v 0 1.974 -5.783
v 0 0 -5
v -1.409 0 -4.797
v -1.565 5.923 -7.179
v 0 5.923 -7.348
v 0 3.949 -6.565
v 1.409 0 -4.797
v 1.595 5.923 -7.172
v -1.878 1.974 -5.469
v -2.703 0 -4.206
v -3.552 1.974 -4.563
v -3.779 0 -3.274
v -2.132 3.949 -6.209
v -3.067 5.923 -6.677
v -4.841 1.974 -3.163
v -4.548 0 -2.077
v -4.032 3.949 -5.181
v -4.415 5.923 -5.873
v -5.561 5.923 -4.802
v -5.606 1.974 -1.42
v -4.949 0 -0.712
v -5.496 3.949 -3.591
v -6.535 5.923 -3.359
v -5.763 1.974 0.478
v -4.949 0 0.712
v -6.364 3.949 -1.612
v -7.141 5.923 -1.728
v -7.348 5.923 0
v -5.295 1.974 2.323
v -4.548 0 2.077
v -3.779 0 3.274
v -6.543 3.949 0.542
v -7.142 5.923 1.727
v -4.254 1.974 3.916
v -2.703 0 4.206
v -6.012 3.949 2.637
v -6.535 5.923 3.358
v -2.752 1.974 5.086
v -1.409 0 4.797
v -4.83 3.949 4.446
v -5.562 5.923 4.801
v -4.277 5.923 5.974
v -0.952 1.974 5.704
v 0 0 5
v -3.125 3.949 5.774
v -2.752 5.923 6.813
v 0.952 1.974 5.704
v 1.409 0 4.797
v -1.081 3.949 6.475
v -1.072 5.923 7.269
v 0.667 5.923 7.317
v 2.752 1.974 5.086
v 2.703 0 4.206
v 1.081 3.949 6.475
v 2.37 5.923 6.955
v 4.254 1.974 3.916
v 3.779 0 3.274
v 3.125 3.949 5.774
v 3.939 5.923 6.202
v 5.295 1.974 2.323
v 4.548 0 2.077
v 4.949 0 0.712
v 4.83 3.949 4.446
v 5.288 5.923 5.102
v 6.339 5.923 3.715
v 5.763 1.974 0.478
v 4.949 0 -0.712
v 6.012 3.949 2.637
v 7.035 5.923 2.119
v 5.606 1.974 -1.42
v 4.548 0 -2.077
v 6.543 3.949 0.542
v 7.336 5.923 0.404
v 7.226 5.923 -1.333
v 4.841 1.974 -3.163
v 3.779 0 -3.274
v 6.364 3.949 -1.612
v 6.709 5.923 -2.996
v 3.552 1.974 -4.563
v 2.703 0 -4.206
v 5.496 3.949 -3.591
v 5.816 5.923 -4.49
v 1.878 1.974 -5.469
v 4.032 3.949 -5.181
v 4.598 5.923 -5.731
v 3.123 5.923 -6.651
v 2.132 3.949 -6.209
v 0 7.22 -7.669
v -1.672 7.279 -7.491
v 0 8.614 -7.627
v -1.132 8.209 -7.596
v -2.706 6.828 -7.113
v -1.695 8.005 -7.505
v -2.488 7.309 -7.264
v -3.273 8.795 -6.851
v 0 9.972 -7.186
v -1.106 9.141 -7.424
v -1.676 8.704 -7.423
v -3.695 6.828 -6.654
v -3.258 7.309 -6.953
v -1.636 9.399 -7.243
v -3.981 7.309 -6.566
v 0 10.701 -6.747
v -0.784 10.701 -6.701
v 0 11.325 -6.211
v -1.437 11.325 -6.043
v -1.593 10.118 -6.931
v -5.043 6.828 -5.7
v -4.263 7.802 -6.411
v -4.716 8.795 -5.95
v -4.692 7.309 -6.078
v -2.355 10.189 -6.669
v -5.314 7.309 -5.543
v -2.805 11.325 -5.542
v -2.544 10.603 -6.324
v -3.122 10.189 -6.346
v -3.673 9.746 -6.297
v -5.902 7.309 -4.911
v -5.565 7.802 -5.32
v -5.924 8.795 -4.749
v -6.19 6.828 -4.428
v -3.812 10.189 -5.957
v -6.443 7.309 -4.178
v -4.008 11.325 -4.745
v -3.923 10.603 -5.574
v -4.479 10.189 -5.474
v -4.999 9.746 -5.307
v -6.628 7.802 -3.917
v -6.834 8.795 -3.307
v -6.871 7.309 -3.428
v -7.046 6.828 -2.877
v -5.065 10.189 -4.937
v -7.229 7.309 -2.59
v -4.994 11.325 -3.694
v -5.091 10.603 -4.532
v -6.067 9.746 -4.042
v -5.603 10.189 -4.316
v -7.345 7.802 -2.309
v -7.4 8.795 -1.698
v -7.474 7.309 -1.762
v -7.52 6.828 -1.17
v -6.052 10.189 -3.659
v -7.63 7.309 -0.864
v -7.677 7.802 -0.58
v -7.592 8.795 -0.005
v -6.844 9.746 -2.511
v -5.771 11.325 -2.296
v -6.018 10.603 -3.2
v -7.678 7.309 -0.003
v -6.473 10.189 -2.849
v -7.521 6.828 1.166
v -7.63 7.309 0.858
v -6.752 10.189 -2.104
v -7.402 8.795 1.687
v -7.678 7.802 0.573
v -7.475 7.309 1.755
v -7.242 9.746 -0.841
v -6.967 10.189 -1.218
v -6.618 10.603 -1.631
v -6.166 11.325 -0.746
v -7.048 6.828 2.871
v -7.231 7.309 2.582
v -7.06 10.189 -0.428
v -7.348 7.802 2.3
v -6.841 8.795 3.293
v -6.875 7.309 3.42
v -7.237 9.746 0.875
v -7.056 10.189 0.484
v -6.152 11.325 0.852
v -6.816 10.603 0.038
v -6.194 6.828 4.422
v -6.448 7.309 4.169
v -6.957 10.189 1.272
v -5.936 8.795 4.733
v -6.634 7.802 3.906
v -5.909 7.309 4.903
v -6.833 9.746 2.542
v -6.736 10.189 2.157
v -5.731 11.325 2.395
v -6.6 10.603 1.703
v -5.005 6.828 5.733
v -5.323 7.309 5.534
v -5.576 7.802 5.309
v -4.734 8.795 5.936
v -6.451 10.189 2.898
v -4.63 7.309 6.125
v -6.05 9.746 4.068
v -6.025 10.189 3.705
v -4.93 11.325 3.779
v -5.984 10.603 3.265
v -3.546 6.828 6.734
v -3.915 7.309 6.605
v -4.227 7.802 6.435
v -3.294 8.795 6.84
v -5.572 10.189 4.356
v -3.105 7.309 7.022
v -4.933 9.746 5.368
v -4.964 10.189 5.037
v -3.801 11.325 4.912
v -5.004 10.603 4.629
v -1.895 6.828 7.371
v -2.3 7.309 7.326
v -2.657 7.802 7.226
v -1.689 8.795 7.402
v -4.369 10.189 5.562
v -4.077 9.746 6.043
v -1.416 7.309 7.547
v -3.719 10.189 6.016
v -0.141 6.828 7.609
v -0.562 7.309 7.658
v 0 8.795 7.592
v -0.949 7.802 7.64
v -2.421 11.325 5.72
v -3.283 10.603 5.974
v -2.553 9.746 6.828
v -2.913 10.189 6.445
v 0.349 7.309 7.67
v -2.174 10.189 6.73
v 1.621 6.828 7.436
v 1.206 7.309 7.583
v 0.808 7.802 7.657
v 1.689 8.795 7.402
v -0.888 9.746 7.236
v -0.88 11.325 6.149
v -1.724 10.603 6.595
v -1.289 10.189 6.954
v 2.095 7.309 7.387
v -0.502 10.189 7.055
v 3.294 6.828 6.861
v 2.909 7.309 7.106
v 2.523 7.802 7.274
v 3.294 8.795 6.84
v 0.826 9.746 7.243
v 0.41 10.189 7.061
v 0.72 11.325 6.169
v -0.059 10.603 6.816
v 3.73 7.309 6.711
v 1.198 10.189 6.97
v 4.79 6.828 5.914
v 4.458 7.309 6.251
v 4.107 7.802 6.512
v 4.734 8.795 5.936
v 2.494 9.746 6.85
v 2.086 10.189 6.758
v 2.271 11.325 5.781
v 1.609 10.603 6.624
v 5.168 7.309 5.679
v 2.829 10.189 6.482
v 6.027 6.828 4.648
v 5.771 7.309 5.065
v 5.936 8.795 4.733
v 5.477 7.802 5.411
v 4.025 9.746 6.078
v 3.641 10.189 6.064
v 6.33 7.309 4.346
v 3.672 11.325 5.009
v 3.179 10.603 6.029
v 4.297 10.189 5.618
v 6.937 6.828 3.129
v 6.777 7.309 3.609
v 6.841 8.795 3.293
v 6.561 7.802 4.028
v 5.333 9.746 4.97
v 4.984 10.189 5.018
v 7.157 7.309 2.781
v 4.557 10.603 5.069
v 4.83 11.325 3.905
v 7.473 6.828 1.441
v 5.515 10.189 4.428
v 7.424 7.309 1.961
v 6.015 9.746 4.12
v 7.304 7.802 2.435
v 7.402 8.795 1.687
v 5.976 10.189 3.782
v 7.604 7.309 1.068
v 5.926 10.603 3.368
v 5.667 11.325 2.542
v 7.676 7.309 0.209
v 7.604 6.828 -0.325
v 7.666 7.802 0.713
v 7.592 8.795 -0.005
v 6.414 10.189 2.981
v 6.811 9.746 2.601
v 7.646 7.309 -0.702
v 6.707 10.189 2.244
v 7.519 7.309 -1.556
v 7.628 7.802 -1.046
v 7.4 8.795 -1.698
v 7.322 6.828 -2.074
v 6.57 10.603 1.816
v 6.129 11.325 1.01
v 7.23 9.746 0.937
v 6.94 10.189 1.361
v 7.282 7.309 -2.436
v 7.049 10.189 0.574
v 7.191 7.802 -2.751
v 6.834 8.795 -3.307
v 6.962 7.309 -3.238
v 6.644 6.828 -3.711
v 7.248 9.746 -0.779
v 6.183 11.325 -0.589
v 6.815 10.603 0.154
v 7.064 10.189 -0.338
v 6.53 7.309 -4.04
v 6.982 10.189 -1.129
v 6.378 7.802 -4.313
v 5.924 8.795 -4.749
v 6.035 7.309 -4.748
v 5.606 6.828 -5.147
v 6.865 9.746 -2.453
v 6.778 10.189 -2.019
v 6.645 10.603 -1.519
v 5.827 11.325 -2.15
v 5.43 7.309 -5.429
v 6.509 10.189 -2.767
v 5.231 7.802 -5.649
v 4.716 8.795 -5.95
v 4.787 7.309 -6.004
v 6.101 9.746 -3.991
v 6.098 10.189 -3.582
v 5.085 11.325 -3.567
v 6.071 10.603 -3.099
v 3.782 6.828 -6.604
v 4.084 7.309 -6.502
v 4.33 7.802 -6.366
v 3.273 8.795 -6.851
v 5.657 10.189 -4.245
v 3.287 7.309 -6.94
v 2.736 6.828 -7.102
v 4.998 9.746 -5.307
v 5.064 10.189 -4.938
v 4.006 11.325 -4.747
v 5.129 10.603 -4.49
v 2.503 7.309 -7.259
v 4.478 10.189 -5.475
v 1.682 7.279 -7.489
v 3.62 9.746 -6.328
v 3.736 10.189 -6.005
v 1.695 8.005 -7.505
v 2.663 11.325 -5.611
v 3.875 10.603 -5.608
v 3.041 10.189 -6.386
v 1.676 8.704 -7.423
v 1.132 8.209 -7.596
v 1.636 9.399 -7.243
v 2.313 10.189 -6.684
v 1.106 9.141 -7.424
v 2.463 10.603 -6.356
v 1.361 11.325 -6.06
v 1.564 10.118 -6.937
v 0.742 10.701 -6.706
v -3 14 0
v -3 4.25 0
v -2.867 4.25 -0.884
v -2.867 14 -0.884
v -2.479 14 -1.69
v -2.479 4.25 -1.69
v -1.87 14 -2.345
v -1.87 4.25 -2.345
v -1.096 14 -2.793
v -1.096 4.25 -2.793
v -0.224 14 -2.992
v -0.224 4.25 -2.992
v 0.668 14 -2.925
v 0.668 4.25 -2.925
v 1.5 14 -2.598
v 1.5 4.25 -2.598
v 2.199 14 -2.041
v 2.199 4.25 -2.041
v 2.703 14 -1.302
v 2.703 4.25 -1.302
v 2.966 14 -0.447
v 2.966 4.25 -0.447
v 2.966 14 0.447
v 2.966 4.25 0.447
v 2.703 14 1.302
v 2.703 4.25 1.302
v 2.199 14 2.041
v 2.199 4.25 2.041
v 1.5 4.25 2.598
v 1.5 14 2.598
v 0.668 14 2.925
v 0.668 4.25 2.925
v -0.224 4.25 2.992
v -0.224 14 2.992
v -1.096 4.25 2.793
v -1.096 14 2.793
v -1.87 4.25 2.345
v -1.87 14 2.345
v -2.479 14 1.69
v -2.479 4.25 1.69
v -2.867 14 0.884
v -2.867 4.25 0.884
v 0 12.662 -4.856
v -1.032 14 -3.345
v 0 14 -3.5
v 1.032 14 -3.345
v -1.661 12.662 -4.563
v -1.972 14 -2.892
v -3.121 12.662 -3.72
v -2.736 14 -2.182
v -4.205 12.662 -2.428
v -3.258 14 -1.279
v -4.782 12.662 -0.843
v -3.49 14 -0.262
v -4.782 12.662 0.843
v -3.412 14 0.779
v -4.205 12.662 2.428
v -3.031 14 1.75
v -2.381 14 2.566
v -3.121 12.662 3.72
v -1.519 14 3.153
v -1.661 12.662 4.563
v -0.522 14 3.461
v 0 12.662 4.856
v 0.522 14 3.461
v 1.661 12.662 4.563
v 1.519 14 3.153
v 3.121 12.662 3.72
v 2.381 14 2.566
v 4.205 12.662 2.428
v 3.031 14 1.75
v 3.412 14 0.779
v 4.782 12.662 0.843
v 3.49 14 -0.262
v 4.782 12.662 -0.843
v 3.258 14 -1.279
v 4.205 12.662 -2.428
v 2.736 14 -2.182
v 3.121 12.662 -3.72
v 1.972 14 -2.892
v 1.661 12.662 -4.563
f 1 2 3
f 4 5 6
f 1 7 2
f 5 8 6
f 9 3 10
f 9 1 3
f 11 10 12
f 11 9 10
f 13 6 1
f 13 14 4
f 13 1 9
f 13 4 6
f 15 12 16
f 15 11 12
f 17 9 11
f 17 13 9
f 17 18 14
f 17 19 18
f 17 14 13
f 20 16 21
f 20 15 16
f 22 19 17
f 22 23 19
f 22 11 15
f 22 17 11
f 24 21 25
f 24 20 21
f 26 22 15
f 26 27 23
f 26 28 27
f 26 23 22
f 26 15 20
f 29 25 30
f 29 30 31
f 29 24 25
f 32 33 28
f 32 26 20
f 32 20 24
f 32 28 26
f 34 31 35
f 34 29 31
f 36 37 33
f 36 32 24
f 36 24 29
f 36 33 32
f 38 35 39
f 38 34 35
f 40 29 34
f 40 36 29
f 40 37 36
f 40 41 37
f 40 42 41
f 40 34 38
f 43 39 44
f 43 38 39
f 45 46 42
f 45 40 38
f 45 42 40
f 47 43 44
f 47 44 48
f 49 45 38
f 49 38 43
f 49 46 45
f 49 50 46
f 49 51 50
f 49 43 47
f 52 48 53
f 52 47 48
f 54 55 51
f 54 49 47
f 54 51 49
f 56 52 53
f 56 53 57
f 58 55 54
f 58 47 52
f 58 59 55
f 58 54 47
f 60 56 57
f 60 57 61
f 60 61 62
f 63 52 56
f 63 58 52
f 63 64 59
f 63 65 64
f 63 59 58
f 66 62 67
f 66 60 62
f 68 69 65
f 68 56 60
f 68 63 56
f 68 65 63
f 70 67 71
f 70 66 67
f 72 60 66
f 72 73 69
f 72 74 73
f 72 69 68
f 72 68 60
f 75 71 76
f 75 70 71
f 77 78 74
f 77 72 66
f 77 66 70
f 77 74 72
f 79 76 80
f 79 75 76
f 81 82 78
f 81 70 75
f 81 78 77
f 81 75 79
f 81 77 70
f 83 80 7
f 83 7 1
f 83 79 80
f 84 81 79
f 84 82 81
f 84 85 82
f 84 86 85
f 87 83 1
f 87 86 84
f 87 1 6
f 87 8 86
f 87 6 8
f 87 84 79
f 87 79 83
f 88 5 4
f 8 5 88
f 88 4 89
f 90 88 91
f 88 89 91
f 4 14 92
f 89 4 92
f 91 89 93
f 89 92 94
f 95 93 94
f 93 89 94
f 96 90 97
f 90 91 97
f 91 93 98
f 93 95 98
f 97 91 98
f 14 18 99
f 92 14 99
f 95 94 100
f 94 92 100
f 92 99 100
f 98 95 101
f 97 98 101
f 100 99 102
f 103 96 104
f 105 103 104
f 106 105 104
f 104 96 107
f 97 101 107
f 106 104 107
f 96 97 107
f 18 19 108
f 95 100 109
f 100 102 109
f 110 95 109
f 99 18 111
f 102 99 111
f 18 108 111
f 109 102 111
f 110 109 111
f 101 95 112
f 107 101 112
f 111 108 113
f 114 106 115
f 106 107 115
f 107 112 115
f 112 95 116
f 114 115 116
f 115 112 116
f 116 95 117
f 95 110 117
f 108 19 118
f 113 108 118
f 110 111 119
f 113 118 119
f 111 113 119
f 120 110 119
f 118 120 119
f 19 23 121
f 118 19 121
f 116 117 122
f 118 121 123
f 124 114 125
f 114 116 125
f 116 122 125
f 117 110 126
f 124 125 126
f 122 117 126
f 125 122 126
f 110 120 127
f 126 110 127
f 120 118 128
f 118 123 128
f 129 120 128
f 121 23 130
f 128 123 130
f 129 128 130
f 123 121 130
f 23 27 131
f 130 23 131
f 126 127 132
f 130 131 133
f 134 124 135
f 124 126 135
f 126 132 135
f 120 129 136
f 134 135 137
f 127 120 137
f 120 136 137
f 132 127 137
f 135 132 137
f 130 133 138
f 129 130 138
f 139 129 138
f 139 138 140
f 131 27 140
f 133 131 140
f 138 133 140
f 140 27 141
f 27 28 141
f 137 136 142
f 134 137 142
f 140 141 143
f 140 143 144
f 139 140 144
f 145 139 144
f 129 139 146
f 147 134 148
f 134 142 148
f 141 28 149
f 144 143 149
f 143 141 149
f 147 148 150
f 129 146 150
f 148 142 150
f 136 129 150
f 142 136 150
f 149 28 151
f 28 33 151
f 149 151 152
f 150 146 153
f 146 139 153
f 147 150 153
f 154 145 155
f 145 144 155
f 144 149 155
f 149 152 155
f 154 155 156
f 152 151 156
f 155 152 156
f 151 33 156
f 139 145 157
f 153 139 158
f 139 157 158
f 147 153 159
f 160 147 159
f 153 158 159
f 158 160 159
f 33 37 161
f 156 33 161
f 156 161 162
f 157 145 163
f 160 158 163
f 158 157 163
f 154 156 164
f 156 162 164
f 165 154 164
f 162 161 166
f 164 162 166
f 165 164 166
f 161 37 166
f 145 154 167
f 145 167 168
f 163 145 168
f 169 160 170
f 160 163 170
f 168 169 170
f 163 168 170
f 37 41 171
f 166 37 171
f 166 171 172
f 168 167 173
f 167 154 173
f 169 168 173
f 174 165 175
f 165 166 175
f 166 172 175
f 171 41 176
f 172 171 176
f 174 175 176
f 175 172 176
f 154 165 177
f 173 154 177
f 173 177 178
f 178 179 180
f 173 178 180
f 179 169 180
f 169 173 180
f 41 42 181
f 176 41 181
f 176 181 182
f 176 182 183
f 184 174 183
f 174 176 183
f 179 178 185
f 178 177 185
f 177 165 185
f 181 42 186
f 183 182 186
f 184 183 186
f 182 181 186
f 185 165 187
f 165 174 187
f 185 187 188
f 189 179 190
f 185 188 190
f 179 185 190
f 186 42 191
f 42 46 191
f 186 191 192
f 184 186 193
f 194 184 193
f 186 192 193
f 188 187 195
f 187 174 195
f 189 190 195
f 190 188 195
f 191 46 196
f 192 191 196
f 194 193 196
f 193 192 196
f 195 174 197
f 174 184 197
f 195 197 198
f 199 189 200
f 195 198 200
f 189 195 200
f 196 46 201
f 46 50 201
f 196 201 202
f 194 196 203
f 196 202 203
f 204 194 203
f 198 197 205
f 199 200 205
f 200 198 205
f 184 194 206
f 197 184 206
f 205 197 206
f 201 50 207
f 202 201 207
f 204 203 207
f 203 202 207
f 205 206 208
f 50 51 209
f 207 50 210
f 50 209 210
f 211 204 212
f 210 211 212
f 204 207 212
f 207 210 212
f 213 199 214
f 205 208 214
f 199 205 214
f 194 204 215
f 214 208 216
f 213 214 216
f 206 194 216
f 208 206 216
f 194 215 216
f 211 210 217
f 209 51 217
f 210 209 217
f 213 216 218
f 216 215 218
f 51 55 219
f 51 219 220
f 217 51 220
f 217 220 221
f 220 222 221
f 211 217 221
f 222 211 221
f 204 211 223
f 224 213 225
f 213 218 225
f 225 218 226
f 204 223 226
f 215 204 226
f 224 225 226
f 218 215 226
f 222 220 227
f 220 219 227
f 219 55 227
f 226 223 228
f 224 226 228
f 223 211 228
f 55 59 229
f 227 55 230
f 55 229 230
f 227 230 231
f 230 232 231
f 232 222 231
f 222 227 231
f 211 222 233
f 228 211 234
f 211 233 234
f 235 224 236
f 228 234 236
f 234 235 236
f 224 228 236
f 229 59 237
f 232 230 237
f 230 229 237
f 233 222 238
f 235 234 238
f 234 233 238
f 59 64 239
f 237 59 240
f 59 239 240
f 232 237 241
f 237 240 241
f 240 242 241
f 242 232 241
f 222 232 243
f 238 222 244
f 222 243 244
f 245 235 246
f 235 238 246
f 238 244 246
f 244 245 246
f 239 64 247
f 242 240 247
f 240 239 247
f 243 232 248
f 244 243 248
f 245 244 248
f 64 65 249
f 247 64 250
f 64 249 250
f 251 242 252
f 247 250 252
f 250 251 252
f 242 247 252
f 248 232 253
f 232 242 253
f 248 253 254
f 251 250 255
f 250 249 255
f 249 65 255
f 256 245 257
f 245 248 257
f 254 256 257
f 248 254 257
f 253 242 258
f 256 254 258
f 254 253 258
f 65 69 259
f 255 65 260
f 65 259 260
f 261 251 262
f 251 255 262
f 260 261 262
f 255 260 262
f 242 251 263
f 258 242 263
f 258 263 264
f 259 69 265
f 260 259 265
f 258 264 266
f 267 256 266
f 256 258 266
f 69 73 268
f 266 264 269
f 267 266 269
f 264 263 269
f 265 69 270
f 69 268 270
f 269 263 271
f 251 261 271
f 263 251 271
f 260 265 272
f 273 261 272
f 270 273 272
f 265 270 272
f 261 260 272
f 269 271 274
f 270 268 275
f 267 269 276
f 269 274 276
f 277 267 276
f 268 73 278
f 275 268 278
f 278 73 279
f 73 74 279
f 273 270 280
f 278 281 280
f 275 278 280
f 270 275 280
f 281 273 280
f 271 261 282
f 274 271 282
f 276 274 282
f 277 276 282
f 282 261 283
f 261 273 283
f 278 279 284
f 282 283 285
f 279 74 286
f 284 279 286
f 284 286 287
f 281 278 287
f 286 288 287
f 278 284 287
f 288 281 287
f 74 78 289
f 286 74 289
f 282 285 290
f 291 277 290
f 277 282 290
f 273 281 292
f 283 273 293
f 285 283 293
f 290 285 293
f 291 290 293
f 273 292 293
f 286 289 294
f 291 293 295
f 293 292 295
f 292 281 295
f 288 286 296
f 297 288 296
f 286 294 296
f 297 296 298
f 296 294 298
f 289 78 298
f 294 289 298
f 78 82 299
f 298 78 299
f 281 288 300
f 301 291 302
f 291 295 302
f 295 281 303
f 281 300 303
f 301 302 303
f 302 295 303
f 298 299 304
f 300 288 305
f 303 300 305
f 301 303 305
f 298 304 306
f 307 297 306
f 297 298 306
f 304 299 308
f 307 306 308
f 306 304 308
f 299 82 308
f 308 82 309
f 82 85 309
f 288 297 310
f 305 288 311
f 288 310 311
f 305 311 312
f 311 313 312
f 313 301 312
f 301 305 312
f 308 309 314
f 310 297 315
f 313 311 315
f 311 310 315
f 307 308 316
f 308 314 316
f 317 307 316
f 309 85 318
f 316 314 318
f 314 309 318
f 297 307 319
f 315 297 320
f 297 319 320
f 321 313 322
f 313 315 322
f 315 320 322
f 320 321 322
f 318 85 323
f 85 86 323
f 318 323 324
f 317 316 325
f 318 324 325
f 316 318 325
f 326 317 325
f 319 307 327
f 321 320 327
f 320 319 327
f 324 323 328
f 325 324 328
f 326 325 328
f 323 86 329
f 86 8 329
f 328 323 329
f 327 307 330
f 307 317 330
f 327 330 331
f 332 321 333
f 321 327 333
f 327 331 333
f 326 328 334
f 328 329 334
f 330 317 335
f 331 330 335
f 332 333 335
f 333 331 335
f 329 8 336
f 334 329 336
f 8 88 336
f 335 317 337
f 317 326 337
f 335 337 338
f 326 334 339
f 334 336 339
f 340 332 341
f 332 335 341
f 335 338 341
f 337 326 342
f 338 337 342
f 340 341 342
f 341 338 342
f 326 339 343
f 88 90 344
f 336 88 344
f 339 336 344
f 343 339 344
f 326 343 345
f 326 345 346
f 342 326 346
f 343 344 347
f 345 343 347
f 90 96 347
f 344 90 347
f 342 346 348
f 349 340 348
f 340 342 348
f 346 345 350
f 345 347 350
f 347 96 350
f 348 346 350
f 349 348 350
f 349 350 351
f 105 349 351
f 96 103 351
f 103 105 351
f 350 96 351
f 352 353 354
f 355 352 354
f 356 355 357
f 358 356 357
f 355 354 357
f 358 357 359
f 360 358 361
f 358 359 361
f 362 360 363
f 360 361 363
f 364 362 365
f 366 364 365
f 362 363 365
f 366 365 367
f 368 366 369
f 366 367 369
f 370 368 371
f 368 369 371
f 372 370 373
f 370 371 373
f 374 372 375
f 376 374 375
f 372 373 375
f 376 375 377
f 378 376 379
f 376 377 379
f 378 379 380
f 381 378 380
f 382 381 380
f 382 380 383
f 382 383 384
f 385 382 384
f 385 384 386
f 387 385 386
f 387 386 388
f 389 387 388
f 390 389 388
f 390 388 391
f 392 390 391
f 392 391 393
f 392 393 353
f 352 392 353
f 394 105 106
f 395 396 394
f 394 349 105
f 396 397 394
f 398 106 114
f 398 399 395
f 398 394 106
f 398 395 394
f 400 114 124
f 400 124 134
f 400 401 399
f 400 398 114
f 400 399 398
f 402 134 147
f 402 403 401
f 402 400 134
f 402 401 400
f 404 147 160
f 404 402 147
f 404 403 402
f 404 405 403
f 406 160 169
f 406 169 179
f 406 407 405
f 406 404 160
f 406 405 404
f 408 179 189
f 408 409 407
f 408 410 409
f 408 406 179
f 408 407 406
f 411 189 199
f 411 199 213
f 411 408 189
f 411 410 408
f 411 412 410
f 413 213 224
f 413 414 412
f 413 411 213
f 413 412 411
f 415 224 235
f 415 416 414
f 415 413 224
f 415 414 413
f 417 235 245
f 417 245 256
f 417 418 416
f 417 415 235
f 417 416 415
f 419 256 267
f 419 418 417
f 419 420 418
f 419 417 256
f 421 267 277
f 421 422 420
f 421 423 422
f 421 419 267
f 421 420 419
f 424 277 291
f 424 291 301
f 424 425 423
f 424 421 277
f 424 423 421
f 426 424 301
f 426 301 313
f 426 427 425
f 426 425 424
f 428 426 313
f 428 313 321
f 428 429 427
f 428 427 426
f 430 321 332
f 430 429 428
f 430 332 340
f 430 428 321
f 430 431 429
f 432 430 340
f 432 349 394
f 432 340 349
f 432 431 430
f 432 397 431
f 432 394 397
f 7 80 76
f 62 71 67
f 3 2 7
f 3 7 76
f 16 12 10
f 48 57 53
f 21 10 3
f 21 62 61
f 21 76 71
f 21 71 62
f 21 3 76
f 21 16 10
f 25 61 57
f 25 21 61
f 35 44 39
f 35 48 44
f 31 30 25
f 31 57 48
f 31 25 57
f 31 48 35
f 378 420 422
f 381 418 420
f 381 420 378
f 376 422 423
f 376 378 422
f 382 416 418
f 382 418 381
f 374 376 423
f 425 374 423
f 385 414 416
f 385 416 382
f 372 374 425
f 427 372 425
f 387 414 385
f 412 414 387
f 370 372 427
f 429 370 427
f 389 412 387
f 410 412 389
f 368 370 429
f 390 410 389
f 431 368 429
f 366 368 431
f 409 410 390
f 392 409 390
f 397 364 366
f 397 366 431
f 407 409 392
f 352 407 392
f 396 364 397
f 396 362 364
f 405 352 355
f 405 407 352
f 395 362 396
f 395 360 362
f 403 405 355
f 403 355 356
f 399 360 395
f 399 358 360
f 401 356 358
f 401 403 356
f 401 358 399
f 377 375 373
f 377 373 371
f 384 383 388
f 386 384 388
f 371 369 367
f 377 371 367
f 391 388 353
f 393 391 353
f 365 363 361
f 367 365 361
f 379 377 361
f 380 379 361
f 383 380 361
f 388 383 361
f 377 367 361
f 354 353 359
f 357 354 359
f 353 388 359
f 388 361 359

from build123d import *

# Parameters (mm, degrees)
M8_TAPPED_HOLE1_D     = 6
M8_TAPPED_HOLE1_DEPTH = 9.75
FILLET1_R             = 5


with BuildPart() as part:
    # Sketch1 → Revolve1 (revolve)
    with BuildSketch(Plane(origin=(0, 0, 0), x_dir=(0, 0, -1), z_dir=(1, 0, 0))):
        Polygon((0, 0), (5, 0), (8.566874978, 9), (3.5, 14), (0, 14), align=None)
    revolve(axis=Axis((0, 0, 0), (0, 1, 0)))

    # M8 Tapped Hole1
    with Locations(Plane(origin=(0, 14, 0), x_dir=(1, 0, 0), z_dir=(0, 1, 0))):
        with Locations((0, 0)):
            Hole(M8_TAPPED_HOLE1_D / 2, depth=M8_TAPPED_HOLE1_DEPTH)

    # Fillet1
    fillet1_edges = [part.edges().sort_by_distance(p)[0] for p in [
        (0, 9, 8.566874978),
    ]]
    fillet(fillet1_edges, radius=FILLET1_R)


solid = part.part
